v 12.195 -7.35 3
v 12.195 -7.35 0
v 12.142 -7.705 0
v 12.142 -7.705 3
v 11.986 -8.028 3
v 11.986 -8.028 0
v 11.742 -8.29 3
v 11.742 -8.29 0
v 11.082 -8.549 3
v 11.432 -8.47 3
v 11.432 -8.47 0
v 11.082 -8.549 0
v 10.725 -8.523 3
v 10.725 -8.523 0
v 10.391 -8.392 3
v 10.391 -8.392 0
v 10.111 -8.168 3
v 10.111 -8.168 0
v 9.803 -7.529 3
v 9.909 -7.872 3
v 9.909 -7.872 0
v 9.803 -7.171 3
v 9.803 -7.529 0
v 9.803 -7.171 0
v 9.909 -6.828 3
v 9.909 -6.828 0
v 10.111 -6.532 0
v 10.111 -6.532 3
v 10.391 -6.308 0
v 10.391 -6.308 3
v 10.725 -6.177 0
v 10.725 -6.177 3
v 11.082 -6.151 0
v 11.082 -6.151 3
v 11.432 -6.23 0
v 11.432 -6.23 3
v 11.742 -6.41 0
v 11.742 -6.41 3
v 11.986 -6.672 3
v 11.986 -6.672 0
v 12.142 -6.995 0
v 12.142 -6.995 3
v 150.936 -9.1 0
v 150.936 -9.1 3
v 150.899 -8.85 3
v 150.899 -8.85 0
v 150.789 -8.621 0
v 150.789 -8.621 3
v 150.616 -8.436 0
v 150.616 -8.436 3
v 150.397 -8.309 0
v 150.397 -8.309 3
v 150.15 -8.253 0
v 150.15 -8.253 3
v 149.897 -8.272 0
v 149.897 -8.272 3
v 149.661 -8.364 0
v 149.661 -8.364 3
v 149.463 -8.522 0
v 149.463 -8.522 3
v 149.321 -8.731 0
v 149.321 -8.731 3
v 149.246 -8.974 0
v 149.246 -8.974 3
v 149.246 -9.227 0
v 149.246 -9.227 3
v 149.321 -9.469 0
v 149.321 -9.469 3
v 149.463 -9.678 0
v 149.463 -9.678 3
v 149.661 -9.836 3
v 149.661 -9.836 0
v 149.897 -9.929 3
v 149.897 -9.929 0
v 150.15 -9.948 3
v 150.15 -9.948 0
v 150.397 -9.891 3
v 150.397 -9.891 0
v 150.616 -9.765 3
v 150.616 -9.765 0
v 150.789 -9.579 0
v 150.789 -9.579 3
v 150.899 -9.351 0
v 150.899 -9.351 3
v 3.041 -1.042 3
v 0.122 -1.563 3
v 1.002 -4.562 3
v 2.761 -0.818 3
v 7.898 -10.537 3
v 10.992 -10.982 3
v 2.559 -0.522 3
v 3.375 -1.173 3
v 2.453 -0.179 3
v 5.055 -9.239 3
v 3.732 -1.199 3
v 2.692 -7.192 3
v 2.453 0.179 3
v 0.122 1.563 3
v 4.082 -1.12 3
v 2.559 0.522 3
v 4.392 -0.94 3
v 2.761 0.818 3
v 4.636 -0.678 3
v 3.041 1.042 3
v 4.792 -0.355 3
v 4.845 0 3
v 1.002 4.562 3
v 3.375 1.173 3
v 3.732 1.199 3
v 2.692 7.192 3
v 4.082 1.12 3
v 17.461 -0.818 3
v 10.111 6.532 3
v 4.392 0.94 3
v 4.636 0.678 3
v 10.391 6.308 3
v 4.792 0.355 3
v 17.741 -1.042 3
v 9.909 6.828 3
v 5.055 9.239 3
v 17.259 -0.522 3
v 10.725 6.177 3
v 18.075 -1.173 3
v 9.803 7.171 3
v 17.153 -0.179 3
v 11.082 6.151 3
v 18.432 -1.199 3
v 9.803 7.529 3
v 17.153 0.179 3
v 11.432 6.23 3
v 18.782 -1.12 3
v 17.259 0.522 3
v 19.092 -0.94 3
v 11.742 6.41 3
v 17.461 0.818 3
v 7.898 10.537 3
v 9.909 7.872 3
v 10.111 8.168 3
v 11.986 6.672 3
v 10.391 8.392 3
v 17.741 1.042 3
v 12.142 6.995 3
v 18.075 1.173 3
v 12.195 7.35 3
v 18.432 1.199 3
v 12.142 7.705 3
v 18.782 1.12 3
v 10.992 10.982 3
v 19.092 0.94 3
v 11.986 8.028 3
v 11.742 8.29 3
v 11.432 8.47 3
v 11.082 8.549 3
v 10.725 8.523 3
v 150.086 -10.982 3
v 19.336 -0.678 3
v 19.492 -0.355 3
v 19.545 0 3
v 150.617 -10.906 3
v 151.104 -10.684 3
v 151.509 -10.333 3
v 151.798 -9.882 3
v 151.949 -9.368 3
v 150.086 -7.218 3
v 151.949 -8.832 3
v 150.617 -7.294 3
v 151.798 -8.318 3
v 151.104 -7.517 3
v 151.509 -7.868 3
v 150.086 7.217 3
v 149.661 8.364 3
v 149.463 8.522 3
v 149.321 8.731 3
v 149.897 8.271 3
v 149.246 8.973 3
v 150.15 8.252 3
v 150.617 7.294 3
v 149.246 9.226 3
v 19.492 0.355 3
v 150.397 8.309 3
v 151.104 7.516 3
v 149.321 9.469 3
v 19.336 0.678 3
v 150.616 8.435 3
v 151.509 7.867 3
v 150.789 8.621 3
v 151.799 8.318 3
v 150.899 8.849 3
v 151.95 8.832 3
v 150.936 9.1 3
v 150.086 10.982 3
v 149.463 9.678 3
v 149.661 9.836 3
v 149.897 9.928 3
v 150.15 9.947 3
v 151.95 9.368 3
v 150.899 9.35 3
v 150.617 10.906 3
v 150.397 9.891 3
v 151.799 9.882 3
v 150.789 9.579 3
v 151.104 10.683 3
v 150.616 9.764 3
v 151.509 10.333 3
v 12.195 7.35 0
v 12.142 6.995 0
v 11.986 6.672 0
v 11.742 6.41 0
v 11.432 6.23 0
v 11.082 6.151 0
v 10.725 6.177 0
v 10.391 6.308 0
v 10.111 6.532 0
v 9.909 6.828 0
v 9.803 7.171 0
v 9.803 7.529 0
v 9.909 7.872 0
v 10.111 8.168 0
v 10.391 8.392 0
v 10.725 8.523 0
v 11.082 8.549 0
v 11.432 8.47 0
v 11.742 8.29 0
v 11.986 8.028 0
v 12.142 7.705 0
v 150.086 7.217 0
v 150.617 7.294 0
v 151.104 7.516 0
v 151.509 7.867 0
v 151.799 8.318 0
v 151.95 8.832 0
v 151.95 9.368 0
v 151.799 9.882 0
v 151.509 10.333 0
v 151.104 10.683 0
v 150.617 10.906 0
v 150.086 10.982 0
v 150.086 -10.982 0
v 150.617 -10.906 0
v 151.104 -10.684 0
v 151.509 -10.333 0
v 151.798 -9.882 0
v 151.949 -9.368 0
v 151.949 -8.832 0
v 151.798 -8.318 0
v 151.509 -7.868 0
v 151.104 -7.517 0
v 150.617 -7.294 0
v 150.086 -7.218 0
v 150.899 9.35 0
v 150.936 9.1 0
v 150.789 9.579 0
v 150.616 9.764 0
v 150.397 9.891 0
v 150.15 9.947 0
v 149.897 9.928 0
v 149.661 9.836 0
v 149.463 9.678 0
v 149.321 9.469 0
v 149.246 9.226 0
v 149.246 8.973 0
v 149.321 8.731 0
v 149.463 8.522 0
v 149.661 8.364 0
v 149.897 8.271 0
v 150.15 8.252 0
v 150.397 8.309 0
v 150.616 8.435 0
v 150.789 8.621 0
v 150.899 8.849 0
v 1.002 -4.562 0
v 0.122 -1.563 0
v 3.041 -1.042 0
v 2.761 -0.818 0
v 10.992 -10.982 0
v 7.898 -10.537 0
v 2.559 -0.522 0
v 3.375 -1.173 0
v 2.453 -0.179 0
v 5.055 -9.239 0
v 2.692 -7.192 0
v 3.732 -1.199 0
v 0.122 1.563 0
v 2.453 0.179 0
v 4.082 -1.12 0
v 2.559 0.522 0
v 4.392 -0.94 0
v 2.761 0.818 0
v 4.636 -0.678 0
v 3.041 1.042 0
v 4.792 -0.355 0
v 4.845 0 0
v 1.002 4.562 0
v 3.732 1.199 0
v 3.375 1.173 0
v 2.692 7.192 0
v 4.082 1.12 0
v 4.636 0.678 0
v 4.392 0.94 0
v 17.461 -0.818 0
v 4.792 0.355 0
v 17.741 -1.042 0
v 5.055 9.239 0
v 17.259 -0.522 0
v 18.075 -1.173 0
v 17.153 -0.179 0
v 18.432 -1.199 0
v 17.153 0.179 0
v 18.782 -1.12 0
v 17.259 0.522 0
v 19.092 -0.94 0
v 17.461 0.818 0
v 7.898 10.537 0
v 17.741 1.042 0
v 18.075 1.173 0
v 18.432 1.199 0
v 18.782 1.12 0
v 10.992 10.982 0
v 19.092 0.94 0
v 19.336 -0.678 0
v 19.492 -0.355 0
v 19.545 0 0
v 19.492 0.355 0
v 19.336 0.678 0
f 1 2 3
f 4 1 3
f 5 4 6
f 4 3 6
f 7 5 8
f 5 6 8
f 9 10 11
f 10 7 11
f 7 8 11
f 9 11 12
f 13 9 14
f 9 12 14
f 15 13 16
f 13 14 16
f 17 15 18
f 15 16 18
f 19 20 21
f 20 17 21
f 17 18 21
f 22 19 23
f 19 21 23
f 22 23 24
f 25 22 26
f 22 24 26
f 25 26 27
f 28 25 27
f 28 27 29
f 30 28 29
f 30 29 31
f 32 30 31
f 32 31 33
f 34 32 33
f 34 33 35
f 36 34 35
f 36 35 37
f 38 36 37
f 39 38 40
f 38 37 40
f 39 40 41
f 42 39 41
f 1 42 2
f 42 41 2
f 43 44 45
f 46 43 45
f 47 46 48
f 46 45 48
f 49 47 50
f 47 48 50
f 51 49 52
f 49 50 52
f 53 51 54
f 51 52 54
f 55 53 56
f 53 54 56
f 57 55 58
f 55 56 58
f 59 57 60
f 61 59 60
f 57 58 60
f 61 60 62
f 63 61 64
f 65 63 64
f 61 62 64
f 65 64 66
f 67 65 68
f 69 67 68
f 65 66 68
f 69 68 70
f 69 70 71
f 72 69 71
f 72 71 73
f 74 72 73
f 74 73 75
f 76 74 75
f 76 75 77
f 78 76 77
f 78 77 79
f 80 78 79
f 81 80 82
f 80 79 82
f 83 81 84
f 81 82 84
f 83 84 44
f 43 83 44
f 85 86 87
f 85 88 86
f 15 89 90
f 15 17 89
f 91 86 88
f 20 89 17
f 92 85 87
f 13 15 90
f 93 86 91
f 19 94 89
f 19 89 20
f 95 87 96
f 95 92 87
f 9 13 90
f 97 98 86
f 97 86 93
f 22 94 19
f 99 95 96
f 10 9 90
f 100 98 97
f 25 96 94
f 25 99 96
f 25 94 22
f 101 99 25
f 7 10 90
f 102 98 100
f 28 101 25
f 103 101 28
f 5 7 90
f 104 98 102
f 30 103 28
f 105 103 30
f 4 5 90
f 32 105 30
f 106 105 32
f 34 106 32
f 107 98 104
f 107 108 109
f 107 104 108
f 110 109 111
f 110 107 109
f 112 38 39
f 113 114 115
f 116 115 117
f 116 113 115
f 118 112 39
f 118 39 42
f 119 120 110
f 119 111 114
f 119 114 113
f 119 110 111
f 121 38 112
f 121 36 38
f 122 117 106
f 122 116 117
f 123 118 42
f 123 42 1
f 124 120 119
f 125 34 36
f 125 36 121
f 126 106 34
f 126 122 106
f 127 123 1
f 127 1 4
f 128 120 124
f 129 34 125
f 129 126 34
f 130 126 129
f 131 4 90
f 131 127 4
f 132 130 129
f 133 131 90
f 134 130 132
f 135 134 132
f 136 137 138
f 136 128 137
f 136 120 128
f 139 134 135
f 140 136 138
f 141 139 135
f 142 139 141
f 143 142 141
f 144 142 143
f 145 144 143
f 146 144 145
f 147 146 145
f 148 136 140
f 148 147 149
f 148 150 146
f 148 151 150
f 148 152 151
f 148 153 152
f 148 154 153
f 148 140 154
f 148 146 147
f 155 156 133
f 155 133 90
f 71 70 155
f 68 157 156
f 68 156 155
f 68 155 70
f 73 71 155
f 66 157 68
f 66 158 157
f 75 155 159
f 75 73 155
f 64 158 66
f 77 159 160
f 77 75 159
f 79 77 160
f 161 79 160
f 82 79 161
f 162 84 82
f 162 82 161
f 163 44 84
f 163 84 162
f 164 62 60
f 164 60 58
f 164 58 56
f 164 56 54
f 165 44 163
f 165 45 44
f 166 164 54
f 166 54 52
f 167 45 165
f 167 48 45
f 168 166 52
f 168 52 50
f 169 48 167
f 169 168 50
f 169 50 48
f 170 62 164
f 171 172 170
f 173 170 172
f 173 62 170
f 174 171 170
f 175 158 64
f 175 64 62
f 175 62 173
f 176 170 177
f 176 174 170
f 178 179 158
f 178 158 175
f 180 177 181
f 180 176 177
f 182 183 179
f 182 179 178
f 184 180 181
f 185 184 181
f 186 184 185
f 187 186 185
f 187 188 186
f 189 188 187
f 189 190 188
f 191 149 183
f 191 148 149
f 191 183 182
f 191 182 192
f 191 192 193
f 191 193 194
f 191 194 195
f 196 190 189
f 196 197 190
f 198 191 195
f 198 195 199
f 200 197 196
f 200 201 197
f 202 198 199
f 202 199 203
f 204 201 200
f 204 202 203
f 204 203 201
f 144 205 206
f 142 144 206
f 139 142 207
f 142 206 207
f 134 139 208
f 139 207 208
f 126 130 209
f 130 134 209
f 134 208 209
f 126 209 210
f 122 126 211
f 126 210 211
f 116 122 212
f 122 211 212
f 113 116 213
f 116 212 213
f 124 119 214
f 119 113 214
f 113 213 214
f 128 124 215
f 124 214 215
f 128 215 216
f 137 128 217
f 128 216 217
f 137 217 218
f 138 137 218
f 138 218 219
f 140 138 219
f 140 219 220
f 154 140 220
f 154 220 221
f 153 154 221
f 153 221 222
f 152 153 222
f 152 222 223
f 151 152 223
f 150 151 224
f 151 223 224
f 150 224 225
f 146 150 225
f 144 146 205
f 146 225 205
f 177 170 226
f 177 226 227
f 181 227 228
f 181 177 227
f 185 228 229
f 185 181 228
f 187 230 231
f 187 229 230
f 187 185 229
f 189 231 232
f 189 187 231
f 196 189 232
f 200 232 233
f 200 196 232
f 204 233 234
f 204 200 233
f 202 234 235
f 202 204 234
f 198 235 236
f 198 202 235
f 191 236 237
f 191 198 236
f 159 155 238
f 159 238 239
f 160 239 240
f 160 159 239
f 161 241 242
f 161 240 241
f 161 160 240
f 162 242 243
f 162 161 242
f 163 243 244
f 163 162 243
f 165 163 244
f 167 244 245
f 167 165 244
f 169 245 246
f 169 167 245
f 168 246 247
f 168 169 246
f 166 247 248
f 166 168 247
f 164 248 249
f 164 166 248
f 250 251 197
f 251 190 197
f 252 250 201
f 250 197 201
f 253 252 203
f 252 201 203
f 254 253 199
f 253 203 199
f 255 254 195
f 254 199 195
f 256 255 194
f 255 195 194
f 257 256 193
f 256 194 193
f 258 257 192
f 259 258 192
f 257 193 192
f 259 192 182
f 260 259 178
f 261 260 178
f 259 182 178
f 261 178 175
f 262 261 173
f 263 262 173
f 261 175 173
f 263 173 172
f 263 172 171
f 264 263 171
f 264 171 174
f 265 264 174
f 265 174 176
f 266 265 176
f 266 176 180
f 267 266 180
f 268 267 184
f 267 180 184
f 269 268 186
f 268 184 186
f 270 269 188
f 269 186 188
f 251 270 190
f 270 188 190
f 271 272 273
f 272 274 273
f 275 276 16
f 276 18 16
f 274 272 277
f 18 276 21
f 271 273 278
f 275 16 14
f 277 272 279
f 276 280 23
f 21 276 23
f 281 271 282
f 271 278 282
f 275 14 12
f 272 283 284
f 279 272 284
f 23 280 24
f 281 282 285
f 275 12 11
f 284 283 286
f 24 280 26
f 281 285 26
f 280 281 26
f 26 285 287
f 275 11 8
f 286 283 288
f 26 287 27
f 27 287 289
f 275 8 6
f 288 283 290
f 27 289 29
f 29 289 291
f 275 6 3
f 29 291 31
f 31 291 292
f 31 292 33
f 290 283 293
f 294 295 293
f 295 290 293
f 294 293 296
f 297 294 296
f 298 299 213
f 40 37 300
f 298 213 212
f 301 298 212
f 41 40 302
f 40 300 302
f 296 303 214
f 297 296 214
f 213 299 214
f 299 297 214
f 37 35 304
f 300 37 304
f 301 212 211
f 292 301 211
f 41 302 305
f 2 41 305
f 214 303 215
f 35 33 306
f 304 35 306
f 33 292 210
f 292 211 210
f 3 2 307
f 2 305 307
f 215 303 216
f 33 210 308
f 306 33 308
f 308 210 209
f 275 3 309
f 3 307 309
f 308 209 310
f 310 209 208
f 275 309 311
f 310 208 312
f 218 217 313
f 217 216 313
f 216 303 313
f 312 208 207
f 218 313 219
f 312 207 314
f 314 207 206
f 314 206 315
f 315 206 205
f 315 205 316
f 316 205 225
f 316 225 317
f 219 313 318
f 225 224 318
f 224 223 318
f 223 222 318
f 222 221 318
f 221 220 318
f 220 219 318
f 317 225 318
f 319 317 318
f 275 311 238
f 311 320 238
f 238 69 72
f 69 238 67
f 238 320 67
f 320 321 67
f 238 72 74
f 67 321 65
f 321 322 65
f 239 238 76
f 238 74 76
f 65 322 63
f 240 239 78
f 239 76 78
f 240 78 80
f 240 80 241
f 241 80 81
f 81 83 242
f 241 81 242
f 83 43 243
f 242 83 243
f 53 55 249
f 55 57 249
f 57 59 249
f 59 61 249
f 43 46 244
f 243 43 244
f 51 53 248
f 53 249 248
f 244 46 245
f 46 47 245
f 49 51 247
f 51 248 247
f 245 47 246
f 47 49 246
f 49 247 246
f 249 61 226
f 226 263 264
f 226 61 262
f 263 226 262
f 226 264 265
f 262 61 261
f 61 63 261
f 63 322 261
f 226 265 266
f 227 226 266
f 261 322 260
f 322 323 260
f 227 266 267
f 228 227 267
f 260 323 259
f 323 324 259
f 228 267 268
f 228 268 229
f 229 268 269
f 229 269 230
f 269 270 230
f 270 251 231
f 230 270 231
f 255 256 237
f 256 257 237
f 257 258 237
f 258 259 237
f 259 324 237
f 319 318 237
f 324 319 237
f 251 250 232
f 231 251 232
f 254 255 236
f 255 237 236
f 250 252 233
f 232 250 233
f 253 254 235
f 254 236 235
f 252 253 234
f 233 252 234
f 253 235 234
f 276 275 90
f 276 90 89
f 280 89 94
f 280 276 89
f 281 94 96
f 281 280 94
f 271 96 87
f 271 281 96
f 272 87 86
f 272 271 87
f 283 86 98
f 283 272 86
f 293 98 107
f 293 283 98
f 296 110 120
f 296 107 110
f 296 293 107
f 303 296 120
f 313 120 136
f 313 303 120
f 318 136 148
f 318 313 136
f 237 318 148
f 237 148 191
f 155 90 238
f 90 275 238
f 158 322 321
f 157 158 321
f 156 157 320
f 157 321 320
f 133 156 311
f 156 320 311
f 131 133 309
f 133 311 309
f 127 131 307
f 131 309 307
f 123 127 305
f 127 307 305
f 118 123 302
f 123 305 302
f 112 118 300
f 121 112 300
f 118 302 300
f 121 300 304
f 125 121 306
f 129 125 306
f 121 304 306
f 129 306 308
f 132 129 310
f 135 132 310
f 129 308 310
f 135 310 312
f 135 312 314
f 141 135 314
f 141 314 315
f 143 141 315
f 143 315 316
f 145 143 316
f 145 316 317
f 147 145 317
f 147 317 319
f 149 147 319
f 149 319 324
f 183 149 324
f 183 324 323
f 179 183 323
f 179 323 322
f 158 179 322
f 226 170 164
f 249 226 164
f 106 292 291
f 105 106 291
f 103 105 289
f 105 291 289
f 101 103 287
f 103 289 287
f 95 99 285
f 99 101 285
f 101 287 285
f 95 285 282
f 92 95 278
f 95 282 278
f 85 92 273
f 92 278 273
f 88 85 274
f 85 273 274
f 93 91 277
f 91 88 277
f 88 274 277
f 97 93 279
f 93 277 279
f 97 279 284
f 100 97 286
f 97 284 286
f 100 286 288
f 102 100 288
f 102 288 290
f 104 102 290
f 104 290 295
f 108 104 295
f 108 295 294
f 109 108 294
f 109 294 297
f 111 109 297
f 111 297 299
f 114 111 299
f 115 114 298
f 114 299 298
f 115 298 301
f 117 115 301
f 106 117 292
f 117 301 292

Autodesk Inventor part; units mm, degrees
ref_plane "YZ Plane" through (0, 0, 0) normal (1, 0, 0) x (0, 1, 0)
ref_plane "XZ Plane" through (0, 0, 0) normal (0, 1, 0) x (-1, 0, 0)
ref_plane "XY Plane" through (0, 0, 0) normal (0, 0, 1) x (1, 0, 0)
ref_plane "Plano de trabajo1" through (0, 0, 0) normal (0, 0, 1) x (1, 0, 0)
sketch "Boceto1" plane through (0, 0, 0) normal (0, 0, 1) x (1, 0, 0)
  circle A0 centre (10.9923, 0) radius 10.9823 projected
  circle A1 centre (10.9923, 7.35) radius 1.2028 projected
  circle A2 centre (3.6423, 0) radius 1.2028 projected
  circle A3 centre (18.3423, 0) radius 1.2028 projected
  circle A4 centre (18.7153, -9.5116) radius 1.05 projected
  circle A5 centre (10.9923, -7.35) radius 1.2028 projected
  line L0 (10.9923, 0) -> (160.9923, 0)
  line L1 (10.9923, 10.9823) -> (160.9923, 10.9823)
  line L2 (10.9923, -10.9823) -> (160.9923, -10.9823)
  line L3 (160.9923, -10.9823) -> (160.9923, 10.9823)
  point P0 (0, 0)
  dimension "d0" = 150
extrude "Extrusión1" add sketch "Boceto1" along normal blind 3
sketch "Boceto2" plane through (0, 0, 3) normal (0, 0, 1) x (1, 0, 0)
  arc A0 (151.1597, 5.5871) -> (154.1073, 8.4343) centre (150.0864, 9.6477) ccw projected
  circle A1 centre (150.0864, -8.5523) radius 0.85 projected
  circle A2 centre (150.0864, 9.6477) radius 0.85 projected
  line L0 (160.9923, 10.9823) -> (10.9923, 10.9823) projected
  line L1 (10.9923, -10.9823) -> (160.9923, -10.9823) projected
  line L2 (160.9923, -10.9823) -> (160.9923, 10.9823) projected
  line L3 (160.9923, 10.9823) -> (10.9923, 10.9823) projected
  arc A3 (10.9923, 10.9823) -> (10.9923, -10.9823) centre (10.9923, 0) ccw projected
  circle A4 centre (18.7153, -9.5116) radius 1.05 projected
  circle A5 centre (10.9923, 7.35) radius 1.2028 projected
  circle A6 centre (3.6423, 0) radius 1.2028 projected
  circle A7 centre (10.9923, -7.35) radius 1.2028 projected
  circle A8 centre (18.3423, 0) radius 1.2028 projected
  line L4 (150.0864, 10.9823) -> (150.0864, -0.0002)
  line L5 (150.0864, -0.0002) -> (150.0864, -9.1002)
  line L6 (150.0864, -0.0002) -> (150.0864, 9.0998)
  circle A9 centre (150.0864, 9.0998) radius 0.85
  circle A10 centre (150.0864, -9.1002) radius 0.85
  circle A11 centre (150.0864, 9.0998) radius 1.8825
  circle A12 centre (150.0864, -9.1002) radius 1.8821
  point P0 (0, 0)
  point P1 (150.0864, 7.2173)
  point P2 (150.0864, -7.218)
  point P3 (150.0864, -10.9823)
  dimension "d3" = 10.9825
  dimension "d4" = 9.1
  dimension "d5" = 9.1
  dimension "d6" = 1.7
  dimension "d7" = 1.7
extrude "Extrusión2" cut sketch "Boceto2" against normal blind 3 contours L5 L4 A11 L0 L2 L1 A12 | A10 A1 | A1 A10 | A9 A2 L4 | L4 A2 A9 | L4 A9 A2 | A2 A9 L4 picked at (149.9501, 8.6317) picked at (150.2191, 8.6309) picked at (150.5614, 9.2824) picked at (149.6114, 9.2824)
sketch "Boceto3" plane through (0, 0, 3) normal (0, 0, 1) x (1, 0, 0)
  point P0 (0, 0)
sketch "Boceto4" plane through (0, 0, 3) normal (0, 0, 1) x (1, 0, 0)
  circle A0 centre (18.7153, -9.5116) radius 1.05 projected
  point P0 (0, 0)
extrude "Extrusión3" add sketch "Boceto4" against normal blind 3
properties part number "tibiaMot"
